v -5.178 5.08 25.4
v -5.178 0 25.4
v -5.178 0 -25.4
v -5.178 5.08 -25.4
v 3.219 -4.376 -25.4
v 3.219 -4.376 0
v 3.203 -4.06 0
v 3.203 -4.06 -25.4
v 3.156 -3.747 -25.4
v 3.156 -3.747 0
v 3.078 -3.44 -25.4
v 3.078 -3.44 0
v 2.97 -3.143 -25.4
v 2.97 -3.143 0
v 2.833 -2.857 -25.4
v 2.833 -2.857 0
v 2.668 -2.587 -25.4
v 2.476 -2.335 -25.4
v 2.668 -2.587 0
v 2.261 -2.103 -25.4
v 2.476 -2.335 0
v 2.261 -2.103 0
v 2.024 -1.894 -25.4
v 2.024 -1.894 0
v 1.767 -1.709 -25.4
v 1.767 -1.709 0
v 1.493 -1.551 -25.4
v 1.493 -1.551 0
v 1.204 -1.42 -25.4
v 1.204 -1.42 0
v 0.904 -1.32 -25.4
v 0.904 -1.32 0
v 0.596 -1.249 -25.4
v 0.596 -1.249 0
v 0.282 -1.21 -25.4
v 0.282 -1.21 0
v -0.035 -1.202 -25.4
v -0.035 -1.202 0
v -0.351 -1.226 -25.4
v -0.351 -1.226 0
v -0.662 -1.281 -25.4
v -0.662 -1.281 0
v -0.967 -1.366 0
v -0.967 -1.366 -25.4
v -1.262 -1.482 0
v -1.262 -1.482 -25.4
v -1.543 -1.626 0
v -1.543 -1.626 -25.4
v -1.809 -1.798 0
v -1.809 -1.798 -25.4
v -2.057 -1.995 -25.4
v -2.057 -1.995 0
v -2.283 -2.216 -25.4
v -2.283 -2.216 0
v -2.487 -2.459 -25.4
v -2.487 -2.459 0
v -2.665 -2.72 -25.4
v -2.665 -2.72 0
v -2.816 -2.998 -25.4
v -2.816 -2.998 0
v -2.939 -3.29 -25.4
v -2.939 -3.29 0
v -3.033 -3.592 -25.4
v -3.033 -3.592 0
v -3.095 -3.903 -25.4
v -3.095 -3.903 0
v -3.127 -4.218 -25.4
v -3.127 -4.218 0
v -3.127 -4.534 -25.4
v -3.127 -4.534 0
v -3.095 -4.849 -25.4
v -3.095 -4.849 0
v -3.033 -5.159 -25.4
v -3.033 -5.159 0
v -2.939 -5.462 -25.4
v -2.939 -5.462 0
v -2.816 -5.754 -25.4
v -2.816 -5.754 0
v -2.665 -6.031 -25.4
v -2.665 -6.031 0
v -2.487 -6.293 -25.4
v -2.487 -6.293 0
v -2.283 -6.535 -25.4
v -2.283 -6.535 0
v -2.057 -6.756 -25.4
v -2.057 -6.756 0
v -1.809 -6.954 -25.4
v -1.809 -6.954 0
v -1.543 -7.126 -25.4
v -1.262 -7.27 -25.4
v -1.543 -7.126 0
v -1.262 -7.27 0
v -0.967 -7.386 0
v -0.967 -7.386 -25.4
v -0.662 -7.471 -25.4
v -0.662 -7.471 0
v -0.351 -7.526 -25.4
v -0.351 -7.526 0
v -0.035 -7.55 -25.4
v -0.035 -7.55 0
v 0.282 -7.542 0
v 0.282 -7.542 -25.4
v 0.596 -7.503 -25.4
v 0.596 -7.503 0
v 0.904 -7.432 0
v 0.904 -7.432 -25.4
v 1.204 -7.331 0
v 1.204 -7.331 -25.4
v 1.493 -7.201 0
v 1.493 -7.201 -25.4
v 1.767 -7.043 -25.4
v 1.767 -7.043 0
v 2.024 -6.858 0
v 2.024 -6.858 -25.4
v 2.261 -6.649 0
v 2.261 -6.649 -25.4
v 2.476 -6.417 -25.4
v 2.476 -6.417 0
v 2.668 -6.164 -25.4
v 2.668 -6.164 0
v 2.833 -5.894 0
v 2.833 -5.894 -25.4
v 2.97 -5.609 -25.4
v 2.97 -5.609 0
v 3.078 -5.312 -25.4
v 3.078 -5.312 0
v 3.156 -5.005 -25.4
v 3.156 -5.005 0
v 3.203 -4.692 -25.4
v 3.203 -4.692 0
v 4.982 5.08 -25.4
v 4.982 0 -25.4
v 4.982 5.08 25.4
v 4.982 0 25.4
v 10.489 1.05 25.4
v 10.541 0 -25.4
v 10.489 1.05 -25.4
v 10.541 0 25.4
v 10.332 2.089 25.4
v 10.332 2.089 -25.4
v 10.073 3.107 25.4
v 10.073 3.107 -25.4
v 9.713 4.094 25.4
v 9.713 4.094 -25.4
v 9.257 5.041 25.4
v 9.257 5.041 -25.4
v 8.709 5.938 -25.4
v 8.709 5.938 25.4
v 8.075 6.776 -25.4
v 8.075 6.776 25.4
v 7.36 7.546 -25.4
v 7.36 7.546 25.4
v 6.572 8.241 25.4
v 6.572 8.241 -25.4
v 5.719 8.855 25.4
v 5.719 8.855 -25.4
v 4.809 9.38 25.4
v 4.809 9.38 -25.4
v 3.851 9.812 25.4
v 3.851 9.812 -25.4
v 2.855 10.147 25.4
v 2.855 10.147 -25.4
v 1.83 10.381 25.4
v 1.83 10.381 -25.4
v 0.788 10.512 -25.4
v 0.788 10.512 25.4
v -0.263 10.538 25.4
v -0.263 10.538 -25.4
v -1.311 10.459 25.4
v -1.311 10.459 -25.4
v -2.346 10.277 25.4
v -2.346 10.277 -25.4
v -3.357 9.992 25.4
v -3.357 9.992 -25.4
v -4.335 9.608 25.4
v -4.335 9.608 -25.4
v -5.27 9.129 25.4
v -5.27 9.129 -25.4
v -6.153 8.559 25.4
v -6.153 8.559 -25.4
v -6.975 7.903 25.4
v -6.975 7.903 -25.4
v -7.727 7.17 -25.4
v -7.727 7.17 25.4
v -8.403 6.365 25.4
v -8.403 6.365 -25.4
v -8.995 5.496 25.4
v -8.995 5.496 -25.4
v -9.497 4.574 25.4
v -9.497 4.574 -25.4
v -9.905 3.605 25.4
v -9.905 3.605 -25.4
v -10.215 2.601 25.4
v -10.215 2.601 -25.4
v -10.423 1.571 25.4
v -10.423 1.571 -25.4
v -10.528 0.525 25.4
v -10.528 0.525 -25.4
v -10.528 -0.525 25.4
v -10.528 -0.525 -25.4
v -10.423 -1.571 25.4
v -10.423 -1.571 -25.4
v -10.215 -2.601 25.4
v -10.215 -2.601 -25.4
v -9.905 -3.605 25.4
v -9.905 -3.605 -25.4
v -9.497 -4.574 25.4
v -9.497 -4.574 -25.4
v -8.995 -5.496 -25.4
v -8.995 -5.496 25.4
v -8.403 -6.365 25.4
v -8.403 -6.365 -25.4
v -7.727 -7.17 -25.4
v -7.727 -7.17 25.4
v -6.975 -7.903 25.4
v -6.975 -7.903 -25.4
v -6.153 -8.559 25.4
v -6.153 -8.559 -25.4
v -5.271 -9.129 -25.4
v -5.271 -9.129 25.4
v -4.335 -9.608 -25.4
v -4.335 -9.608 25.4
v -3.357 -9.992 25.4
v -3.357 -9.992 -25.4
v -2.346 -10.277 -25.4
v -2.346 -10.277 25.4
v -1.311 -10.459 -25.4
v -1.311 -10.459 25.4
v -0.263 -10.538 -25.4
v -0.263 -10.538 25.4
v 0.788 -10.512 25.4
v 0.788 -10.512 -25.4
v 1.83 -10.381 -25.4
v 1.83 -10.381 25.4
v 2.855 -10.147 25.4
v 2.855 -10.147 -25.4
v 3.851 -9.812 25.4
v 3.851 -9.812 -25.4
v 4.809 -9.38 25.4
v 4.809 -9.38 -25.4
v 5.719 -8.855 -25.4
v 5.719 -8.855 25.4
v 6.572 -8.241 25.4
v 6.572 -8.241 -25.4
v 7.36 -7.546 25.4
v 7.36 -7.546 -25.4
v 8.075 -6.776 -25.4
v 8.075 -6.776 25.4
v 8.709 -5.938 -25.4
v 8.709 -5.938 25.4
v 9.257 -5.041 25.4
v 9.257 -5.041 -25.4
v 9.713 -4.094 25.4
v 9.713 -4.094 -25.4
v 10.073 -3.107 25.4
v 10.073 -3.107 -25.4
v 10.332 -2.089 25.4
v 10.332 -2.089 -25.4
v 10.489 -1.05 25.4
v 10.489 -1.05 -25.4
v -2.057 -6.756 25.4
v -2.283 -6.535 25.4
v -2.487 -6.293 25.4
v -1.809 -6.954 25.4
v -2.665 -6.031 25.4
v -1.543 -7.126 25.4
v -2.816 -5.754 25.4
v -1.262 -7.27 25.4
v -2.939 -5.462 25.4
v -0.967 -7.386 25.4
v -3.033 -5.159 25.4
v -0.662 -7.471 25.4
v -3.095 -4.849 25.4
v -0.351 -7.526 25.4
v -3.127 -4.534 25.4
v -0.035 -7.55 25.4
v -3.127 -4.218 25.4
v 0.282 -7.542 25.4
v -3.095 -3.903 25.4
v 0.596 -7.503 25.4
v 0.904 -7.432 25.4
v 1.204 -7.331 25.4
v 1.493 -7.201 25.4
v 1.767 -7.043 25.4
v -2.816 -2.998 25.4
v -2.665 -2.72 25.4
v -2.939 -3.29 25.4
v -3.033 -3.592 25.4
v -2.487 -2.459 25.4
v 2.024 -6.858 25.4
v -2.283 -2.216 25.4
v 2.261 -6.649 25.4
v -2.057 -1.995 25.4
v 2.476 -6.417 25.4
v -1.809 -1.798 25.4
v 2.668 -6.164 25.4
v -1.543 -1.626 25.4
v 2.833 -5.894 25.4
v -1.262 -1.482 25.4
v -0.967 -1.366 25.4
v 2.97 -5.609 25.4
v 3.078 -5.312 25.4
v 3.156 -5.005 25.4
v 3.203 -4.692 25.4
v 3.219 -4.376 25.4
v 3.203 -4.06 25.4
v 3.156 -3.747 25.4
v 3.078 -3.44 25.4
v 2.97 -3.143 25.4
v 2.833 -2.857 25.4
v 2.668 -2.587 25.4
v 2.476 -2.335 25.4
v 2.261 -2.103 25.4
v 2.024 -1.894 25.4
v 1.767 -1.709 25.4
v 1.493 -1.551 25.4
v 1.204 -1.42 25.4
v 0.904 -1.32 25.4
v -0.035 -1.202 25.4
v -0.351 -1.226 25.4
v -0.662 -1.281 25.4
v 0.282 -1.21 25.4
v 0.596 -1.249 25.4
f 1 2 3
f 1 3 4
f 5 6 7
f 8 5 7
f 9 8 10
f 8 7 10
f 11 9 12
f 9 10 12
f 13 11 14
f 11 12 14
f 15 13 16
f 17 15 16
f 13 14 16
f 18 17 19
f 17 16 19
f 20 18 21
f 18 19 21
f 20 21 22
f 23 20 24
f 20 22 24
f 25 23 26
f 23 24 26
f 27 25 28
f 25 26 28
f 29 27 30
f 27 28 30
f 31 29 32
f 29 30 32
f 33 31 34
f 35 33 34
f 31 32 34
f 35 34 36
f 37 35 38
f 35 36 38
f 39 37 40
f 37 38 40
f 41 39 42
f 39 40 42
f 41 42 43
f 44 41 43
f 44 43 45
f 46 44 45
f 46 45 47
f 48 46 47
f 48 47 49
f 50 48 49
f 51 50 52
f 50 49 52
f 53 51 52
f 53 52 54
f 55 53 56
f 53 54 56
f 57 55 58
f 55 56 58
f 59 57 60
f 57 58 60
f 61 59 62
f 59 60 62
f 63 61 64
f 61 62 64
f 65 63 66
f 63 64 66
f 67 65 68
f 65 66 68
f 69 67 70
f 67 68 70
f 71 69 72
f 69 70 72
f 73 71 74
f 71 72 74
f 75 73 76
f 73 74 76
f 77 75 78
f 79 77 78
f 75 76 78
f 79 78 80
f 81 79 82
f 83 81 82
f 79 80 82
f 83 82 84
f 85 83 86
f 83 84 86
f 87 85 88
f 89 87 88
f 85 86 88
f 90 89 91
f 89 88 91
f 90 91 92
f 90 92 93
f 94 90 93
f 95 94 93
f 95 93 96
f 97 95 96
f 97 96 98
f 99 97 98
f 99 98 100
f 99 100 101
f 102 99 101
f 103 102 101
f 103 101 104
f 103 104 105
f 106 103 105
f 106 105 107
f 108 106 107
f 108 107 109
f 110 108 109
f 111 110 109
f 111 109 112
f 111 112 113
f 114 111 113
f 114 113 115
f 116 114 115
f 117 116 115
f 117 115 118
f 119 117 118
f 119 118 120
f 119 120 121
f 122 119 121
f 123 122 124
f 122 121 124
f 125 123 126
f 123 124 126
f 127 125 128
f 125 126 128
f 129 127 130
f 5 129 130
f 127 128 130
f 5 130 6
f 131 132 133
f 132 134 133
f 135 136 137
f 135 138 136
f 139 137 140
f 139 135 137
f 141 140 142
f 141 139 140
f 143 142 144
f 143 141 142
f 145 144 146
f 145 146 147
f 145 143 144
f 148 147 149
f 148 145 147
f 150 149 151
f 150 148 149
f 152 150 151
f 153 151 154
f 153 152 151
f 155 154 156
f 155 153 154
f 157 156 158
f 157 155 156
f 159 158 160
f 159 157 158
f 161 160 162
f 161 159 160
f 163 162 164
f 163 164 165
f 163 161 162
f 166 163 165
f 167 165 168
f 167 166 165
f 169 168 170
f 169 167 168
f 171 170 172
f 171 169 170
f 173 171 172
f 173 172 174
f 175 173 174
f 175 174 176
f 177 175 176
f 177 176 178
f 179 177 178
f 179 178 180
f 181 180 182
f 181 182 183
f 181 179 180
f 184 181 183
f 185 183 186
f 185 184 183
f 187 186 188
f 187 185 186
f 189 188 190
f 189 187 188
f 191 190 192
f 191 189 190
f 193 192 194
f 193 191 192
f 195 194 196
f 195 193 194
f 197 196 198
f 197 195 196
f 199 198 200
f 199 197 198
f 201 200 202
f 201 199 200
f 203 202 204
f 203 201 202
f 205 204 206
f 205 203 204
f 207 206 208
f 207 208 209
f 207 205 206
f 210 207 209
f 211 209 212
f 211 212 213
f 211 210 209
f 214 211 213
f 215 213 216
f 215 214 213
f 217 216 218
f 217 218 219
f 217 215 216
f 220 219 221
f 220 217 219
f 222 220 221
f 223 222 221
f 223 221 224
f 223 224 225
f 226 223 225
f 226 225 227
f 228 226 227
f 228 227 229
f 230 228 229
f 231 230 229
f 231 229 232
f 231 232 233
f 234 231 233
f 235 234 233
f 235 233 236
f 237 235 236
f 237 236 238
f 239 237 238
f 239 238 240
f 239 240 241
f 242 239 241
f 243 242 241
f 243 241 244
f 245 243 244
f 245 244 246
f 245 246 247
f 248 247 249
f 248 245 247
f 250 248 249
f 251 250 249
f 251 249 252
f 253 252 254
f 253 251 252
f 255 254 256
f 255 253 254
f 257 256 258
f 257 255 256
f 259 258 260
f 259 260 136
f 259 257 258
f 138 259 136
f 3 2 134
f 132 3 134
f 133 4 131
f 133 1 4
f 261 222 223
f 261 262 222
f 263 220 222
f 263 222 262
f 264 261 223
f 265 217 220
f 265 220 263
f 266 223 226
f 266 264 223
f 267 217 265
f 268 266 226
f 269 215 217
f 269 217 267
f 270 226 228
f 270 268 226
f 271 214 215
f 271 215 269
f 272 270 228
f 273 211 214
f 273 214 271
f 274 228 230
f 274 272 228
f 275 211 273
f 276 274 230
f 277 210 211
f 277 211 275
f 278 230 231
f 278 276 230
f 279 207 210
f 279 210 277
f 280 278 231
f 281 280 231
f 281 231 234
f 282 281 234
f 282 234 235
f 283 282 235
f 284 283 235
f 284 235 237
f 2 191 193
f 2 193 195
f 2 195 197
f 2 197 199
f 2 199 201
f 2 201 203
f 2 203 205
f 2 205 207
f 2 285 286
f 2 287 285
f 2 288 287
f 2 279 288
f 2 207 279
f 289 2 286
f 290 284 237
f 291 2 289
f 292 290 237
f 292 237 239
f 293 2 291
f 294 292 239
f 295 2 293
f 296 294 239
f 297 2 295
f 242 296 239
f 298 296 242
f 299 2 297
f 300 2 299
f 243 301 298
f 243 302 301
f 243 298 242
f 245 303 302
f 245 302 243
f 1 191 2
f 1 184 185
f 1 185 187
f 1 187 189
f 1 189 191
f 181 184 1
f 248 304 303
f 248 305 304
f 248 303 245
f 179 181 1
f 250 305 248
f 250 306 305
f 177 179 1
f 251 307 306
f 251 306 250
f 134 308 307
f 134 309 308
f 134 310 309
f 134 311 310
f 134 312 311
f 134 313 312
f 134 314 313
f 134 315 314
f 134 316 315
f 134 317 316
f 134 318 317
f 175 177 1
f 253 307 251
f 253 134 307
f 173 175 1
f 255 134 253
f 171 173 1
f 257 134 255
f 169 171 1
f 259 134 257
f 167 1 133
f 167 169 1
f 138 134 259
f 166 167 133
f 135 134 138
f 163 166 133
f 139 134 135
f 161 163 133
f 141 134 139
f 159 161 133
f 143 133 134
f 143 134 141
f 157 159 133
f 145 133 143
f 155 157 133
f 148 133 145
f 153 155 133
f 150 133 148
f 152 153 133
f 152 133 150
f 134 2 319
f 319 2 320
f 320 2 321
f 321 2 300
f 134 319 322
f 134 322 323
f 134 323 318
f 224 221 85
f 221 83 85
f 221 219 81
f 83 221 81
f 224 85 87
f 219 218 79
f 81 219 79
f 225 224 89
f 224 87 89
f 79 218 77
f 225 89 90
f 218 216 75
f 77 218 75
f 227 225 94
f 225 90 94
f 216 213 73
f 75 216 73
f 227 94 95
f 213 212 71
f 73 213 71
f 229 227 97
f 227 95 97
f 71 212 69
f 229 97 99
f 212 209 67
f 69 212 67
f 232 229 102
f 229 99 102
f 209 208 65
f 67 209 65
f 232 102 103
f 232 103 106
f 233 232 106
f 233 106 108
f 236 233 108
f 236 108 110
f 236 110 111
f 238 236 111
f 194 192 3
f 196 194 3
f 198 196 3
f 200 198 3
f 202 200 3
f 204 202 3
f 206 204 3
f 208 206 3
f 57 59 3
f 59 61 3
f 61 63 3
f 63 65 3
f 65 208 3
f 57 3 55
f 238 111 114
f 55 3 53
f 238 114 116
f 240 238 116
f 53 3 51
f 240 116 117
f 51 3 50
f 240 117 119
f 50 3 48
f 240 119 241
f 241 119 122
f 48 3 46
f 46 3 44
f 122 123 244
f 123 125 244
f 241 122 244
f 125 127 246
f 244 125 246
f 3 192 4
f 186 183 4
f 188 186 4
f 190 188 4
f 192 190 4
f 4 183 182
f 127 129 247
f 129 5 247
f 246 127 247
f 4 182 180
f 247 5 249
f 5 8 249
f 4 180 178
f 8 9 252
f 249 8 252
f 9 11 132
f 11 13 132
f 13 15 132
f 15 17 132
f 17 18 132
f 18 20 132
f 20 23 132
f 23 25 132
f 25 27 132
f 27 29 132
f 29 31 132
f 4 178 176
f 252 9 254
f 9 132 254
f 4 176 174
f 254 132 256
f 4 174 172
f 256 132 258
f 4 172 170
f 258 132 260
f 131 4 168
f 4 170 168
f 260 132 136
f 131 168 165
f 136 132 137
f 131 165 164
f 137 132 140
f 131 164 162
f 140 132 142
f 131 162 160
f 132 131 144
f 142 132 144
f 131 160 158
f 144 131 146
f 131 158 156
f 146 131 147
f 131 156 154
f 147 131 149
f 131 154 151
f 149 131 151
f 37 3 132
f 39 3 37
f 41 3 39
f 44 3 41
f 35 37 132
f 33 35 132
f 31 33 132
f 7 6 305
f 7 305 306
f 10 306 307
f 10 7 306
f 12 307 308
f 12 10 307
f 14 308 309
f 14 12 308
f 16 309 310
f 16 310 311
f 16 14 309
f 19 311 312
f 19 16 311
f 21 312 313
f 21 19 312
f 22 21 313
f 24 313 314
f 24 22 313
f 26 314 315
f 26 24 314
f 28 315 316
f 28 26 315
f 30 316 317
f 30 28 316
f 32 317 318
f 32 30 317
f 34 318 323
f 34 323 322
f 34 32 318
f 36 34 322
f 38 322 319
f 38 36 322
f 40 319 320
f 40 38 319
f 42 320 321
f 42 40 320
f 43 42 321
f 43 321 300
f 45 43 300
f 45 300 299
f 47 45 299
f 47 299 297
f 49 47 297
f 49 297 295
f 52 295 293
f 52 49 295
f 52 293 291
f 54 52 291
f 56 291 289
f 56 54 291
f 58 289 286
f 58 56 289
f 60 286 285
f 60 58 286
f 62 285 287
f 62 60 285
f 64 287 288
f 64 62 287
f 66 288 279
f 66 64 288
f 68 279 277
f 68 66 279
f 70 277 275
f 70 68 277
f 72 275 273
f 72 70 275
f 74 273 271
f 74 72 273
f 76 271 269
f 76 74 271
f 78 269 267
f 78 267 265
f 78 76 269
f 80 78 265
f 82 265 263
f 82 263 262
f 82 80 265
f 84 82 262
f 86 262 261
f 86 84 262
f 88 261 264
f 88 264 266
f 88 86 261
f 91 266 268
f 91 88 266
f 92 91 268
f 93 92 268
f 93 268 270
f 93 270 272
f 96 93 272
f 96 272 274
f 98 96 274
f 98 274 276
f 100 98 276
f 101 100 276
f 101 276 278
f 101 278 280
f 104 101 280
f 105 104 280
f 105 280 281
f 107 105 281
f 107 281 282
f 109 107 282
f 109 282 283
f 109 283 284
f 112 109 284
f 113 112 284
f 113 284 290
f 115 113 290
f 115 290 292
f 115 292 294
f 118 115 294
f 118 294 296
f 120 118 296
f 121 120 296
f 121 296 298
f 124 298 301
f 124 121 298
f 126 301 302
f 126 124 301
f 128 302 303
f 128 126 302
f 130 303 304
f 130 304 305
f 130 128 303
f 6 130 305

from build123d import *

# Parameters (mm, degrees)
F0_R          = 10.541
F1_DEPTH      = 25.4
F1_DEPTH_BACK = 25.4
F2_W          = 10.16
F2_H          = 5.08
F3_DEPTH      = 25.4
F3_DEPTH_BACK = 25.4
F4_R          = 3.175
F5_DEPTH      = 25.4
F5_DEPTH_BACK = 25.4


with BuildPart() as f1:
    # F0 (on Top) → F1 (new body, two sides)
    with BuildSketch(Plane.XY) as f1_sk:
        Circle(F0_R)
    extrude(amount=F1_DEPTH)
    extrude(f1_sk.sketch, amount=-F1_DEPTH_BACK)

    # F2 (on Top) → F3 (cut, two sides)
    with BuildSketch(Plane.XY) as f3_sk:
        with Locations((-0.0976234565, 2.54)):
            Rectangle(F2_W, F2_H)
    extrude(amount=-F3_DEPTH, mode=Mode.SUBTRACT)
    extrude(f3_sk.sketch, amount=F3_DEPTH_BACK, mode=Mode.SUBTRACT)

    # F4 (on Top) → F5 (cut, two sides)
    with BuildSketch(Plane.XY) as f5_sk:
        with Locations((0.0442451081, -4.3759263634)):
            Circle(F4_R)
    extrude(amount=F5_DEPTH, mode=Mode.SUBTRACT)
    extrude(f5_sk.sketch, amount=-F5_DEPTH_BACK, mode=Mode.SUBTRACT)


solid = f1.part
